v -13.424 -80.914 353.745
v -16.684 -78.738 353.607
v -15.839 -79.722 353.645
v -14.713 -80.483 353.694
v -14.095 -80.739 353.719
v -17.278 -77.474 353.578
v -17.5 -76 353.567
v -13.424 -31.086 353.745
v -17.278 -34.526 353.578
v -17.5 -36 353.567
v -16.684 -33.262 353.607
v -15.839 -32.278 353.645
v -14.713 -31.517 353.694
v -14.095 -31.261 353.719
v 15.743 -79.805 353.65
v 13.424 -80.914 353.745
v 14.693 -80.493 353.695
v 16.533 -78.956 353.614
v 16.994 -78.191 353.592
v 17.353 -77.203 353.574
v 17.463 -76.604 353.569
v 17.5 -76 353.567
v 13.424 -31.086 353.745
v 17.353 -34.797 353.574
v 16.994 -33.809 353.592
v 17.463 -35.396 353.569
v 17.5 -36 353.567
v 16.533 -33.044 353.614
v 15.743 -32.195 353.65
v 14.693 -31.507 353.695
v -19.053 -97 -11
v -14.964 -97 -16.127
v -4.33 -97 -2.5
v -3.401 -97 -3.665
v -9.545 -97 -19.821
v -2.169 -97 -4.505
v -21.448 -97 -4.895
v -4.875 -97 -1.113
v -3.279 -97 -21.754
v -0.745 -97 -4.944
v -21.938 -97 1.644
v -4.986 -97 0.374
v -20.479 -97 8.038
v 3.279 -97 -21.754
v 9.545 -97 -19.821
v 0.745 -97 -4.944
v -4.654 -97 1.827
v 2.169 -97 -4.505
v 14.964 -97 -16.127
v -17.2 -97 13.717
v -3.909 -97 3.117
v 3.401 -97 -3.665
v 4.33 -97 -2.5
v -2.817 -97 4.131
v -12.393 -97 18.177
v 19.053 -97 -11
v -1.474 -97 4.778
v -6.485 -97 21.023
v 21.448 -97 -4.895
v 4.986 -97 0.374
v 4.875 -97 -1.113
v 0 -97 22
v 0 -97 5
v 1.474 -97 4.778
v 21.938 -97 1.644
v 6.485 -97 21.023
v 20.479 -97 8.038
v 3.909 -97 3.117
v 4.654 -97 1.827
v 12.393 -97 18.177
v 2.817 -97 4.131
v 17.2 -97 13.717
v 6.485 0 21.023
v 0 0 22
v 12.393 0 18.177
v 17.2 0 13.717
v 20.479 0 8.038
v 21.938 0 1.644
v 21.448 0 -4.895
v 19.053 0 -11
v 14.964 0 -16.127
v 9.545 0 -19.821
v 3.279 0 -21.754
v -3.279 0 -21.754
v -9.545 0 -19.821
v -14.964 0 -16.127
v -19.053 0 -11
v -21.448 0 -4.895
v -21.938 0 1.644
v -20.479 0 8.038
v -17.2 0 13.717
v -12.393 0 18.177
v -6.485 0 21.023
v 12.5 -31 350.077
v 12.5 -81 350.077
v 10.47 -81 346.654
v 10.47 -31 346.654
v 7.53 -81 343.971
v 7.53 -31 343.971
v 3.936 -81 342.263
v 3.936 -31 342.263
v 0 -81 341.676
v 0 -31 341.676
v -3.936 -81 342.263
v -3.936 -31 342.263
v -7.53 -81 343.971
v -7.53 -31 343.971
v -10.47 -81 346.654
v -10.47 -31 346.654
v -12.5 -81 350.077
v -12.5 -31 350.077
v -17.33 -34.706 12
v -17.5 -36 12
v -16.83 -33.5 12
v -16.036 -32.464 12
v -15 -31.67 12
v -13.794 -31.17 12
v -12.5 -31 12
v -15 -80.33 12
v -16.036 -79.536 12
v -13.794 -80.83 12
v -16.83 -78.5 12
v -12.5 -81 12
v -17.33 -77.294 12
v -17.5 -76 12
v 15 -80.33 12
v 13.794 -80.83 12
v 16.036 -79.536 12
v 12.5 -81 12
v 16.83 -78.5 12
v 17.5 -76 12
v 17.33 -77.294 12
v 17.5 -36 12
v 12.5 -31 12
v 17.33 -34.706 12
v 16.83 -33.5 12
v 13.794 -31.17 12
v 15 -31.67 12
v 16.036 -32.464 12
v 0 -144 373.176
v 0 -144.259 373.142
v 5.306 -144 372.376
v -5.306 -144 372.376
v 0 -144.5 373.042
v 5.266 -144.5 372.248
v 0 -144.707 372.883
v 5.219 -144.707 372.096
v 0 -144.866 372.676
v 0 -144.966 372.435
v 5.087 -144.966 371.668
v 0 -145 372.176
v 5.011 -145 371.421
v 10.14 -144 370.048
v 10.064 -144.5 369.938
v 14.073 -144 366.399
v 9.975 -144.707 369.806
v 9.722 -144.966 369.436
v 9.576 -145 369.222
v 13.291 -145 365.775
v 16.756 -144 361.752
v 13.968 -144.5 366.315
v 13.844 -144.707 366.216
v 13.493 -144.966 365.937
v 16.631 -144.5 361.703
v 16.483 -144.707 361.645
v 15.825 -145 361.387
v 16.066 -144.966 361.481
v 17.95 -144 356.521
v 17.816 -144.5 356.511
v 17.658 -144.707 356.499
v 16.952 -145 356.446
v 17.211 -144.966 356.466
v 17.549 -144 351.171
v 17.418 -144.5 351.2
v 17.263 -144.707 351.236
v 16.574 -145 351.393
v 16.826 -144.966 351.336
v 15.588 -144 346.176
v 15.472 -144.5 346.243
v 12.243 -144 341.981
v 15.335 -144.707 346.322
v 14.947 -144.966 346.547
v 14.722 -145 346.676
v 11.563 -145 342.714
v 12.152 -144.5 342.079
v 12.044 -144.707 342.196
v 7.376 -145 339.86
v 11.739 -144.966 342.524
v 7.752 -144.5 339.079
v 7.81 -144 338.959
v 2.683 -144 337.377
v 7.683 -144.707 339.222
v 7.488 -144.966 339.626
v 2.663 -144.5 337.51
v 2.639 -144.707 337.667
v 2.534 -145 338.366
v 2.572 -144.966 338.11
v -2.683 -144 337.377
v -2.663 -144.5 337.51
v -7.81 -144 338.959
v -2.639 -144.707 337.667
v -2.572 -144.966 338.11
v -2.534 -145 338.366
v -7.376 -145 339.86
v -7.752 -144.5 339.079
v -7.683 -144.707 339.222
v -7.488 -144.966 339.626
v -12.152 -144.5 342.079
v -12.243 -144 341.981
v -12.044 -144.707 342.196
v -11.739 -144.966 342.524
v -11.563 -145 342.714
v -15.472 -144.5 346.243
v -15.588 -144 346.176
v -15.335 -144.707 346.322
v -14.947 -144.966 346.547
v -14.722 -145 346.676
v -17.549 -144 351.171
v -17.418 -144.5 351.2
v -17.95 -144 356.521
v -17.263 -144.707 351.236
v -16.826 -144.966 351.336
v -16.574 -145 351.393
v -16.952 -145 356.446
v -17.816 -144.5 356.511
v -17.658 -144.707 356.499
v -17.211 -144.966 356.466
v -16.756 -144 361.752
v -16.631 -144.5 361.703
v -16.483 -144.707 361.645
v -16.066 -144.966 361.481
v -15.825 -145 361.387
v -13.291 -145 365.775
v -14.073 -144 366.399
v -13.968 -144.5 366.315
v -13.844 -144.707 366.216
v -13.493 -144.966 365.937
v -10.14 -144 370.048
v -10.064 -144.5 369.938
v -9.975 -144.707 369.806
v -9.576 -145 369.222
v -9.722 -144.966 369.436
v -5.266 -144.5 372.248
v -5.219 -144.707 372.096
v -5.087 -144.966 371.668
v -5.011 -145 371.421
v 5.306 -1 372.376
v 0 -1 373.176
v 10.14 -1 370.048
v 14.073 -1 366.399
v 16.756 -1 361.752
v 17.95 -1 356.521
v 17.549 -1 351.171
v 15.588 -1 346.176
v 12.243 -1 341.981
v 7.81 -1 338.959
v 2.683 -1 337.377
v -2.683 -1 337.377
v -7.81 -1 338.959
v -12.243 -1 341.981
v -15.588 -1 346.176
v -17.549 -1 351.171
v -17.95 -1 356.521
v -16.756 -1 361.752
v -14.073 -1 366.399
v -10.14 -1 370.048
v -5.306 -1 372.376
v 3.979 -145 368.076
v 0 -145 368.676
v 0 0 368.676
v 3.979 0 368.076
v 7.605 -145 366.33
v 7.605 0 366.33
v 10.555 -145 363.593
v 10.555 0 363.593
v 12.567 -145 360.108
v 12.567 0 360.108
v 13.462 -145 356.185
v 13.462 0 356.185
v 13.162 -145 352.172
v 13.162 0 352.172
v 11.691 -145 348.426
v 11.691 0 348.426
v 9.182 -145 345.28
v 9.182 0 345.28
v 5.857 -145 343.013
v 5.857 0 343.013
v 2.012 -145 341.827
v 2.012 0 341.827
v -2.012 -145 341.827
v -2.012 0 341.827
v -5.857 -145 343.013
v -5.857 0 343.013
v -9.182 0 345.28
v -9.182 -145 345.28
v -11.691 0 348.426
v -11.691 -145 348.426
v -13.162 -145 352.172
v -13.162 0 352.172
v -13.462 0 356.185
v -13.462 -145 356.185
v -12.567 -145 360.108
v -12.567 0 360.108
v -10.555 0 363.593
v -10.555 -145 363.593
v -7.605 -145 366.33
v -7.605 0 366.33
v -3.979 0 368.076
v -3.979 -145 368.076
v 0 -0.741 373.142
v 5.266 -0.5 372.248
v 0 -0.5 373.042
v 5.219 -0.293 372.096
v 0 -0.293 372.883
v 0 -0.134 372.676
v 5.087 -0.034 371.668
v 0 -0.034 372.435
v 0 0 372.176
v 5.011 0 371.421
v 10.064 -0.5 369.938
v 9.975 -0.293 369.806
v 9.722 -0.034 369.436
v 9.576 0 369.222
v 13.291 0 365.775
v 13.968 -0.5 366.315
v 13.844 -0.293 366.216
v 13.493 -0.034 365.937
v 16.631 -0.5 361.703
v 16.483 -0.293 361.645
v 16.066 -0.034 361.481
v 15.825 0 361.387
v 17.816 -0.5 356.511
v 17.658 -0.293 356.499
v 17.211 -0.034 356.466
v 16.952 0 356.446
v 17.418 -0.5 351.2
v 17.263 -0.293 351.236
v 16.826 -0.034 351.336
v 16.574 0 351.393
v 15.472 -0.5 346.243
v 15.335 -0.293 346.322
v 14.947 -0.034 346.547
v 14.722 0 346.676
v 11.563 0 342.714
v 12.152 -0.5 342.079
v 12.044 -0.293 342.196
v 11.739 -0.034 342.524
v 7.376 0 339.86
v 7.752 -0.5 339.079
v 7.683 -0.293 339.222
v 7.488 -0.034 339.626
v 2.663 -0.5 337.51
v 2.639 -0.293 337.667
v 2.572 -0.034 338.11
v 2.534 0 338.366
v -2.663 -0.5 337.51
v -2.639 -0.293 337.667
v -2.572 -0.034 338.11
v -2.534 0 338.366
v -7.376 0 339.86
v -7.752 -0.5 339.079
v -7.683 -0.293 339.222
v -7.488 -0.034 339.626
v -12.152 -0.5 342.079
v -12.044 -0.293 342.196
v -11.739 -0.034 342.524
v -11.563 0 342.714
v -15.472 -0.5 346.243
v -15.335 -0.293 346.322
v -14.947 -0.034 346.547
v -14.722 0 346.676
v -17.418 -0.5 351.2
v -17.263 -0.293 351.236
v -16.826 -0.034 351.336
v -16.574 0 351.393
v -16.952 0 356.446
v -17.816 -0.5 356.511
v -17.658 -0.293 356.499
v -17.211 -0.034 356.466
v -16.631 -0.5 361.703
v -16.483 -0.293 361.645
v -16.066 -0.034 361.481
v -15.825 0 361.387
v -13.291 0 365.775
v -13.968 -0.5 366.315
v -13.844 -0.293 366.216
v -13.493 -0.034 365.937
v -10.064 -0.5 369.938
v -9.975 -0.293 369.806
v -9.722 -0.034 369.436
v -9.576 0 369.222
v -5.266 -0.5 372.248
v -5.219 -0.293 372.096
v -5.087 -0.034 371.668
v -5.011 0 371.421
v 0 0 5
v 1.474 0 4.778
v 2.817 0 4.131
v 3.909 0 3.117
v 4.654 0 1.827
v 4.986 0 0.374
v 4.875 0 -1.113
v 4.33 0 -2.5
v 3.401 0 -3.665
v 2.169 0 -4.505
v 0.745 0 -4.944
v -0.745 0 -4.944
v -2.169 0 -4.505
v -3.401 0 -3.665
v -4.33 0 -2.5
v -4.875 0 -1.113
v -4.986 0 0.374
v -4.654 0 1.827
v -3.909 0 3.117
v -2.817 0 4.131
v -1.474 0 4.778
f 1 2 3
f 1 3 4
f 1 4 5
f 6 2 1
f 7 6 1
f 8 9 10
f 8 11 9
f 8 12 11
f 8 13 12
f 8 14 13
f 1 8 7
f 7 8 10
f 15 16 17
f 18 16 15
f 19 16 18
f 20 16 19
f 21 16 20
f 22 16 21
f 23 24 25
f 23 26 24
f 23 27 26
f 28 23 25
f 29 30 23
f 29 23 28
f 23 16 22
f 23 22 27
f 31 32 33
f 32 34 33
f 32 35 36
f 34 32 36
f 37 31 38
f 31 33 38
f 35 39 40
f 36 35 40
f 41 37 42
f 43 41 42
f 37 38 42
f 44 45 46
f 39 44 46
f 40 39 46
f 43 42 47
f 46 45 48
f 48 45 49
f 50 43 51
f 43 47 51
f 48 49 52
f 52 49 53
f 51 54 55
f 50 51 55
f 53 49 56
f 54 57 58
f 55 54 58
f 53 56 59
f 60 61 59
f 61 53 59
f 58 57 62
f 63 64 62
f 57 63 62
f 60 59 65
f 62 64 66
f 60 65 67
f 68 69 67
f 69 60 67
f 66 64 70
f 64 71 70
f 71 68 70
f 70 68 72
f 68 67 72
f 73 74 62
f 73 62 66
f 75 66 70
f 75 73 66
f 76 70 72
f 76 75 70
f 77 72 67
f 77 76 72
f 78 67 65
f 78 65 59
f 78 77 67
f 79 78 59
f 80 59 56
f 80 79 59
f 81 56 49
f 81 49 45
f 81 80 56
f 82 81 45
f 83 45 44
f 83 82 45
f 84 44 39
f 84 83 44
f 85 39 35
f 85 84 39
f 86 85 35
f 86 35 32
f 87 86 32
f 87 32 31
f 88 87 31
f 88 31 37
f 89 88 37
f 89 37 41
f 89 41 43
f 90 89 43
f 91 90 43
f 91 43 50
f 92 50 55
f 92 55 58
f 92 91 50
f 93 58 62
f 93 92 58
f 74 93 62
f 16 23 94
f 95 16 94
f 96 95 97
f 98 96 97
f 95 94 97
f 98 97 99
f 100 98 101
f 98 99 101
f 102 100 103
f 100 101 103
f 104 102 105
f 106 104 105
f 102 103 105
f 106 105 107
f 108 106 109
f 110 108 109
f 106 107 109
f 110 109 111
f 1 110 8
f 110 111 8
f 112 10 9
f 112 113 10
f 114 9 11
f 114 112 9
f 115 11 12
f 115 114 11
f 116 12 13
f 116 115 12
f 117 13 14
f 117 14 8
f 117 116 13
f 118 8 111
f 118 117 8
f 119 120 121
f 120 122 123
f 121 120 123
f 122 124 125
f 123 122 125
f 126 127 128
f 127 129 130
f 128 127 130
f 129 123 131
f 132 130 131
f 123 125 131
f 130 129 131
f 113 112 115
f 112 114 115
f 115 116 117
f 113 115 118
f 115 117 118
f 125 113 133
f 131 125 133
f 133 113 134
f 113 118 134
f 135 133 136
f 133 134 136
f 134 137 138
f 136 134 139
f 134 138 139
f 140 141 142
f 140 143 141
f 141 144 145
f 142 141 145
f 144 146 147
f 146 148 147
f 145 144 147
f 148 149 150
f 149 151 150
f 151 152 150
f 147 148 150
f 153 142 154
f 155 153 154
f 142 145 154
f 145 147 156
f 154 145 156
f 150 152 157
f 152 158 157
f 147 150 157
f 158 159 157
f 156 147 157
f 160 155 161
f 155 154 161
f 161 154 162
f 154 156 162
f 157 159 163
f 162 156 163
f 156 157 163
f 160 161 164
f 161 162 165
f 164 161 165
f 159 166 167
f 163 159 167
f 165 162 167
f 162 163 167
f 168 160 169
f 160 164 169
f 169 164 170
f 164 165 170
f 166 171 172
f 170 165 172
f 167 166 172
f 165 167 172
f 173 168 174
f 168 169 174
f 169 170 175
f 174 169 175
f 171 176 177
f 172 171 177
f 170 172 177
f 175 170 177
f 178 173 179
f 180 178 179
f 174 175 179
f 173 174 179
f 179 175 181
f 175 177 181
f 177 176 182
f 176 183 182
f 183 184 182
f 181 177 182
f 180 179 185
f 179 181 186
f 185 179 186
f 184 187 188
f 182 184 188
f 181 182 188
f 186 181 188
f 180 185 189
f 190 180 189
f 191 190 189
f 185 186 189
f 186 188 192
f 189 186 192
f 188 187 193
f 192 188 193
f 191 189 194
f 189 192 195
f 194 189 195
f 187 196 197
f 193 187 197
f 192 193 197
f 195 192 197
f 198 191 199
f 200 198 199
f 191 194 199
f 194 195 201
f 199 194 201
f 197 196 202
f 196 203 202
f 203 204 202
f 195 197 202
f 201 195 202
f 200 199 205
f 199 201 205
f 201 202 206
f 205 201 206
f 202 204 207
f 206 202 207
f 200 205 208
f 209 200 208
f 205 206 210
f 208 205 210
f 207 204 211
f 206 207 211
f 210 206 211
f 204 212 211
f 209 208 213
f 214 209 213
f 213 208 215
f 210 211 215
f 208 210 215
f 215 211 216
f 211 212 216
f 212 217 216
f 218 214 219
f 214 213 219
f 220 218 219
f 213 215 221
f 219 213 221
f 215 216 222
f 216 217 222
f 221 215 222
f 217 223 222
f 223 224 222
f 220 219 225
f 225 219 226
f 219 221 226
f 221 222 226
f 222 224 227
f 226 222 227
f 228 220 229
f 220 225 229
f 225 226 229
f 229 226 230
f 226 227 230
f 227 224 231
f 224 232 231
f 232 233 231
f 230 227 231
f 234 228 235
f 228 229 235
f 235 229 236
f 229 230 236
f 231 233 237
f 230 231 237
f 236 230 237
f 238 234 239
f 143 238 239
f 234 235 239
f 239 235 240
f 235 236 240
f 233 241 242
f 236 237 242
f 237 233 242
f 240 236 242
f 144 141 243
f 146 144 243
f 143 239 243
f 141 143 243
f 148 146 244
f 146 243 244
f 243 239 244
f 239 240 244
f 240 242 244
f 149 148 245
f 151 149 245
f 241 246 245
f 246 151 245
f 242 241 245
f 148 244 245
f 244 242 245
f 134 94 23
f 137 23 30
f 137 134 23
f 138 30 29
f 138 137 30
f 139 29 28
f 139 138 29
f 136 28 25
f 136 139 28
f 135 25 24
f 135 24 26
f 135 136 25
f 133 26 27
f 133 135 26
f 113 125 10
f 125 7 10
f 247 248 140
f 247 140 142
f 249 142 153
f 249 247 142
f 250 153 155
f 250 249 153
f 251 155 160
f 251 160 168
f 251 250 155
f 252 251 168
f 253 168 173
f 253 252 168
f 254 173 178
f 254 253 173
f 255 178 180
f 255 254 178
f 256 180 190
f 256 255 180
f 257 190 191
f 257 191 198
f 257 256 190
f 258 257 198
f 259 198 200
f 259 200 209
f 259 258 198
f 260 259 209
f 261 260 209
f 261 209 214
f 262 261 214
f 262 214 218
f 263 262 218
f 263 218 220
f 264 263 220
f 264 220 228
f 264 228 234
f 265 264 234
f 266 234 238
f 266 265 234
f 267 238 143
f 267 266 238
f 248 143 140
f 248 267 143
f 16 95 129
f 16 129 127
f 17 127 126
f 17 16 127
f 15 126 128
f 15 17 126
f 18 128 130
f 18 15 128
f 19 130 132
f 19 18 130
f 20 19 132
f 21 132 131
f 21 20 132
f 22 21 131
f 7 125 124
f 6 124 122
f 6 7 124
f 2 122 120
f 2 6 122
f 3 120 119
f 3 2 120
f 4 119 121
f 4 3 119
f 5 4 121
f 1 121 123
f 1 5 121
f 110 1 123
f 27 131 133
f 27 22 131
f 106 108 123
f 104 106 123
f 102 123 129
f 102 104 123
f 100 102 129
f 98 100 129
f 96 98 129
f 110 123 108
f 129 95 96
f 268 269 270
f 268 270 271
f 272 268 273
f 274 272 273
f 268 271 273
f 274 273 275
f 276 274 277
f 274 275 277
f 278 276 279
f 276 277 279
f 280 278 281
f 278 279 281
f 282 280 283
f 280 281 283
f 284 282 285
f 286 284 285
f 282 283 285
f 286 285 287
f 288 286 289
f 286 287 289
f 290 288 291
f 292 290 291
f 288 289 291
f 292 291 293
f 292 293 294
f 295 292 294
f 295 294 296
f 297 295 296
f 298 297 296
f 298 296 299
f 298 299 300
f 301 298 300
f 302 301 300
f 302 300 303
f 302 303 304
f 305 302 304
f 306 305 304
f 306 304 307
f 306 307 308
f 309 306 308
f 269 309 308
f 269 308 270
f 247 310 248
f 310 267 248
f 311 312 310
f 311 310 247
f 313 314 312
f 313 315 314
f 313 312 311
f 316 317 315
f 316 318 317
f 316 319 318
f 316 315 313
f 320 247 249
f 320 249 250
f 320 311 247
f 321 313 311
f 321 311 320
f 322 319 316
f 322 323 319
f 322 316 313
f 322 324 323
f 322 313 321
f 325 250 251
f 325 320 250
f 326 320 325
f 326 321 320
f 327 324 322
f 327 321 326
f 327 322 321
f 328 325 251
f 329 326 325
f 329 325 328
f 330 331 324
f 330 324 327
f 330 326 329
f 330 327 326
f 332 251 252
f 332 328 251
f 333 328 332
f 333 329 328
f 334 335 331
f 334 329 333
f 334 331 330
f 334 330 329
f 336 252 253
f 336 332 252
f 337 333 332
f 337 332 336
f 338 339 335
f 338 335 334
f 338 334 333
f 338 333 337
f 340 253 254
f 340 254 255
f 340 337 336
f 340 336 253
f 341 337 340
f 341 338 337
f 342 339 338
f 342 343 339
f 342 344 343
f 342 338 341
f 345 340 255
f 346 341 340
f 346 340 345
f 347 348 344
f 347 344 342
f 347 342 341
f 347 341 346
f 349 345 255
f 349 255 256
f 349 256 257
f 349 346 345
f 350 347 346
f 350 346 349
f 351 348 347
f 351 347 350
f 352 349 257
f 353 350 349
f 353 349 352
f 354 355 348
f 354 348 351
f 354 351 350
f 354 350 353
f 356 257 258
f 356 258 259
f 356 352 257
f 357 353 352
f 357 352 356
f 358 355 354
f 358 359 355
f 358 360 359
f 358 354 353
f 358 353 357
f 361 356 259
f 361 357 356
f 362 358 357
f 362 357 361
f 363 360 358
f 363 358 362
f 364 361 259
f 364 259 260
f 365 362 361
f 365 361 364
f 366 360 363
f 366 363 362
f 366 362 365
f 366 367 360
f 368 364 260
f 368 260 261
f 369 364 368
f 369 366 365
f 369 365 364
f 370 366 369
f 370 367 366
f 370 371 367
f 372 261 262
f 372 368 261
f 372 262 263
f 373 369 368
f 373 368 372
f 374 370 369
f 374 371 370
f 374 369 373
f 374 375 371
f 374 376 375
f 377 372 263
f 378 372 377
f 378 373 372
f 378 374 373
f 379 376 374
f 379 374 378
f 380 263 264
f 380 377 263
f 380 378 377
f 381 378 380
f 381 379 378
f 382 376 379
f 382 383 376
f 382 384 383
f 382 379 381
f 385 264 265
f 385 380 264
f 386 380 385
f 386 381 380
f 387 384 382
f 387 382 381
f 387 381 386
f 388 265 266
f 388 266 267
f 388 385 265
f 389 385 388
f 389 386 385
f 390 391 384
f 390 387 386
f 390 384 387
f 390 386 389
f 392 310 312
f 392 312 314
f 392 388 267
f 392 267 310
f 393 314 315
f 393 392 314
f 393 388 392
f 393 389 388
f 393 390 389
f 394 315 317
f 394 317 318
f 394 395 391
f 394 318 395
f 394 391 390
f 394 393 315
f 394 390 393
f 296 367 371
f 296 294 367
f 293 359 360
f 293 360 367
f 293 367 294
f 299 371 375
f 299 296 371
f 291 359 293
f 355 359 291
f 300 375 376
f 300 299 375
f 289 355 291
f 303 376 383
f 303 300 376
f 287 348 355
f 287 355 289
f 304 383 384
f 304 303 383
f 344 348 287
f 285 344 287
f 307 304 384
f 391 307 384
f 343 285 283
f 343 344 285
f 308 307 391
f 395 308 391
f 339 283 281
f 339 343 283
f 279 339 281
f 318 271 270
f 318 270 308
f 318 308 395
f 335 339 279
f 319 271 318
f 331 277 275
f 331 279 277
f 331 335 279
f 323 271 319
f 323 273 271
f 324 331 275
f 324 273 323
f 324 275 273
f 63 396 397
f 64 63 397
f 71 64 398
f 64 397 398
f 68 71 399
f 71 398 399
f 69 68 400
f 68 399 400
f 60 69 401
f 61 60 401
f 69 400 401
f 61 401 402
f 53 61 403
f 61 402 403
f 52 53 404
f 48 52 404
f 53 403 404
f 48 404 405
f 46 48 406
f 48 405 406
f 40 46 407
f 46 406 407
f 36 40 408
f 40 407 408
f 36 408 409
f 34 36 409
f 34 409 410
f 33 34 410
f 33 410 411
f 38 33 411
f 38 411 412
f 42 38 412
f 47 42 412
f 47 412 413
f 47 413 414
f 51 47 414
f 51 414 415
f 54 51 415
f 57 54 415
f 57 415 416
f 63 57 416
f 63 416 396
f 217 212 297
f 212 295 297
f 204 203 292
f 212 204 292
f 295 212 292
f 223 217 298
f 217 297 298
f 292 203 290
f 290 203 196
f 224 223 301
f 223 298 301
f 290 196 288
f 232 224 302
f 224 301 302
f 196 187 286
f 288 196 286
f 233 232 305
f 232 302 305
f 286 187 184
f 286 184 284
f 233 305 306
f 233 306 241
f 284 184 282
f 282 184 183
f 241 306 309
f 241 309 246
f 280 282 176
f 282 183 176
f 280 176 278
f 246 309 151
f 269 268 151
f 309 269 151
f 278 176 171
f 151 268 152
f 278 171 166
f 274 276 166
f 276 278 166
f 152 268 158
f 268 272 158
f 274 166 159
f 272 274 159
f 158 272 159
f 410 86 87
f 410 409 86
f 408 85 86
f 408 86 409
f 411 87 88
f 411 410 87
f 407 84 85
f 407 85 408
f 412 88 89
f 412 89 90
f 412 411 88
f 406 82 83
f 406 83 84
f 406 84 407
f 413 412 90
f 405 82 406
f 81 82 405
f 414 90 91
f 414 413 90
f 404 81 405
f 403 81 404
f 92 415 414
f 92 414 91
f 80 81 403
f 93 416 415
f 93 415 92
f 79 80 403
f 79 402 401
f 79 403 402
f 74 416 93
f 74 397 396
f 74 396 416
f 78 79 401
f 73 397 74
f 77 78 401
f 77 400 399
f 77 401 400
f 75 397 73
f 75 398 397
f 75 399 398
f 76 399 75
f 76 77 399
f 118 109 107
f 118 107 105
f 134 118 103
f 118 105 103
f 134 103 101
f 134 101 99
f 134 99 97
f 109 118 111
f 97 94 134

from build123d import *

# Parameters (mm, degrees)
SKETCH1_R                       = 22
BOSS_EXTRUDE1_DEPTH             = 97
SKETCH2_R                       = 5
CUT_EXTRUDE1_DEPTH              = 102.867561078
BOSS_EXTRUDE2_REACH             = 332.567
BOSS_EXTRUDE2_END_RADIUS        = 354
SKETCH6_W                       = 35
SKETCH6_H                       = 50
BOSS_EXTRUDE2_DIRECTION_2_DEPTH = 10
SKETCH7_R                       = 18
BOSS_EXTRUDE3_DEPTH             = 145
SKETCH8_R                       = 13.5
CUT_EXTRUDE2_DEPTH              = 401.960544509
FILLET1_R                       = 5
FILLET2_R                       = 1


with BuildPart() as part:
    # Sketch1 → Boss-Extrude1 (new body)
    with BuildSketch(Plane(origin=(0, 0, 0), x_dir=(1, 0, 0), z_dir=(0, 1, 0))):
        with Locations(Location((0, 0, 0), (0, 0, 270))):
            Circle(SKETCH1_R)
    extrude(amount=-BOSS_EXTRUDE1_DEPTH)

    # Sketch2 → Cut-Extrude1 (cut, through all)
    with BuildSketch(Plane(origin=(0, 0, 0), x_dir=(1, 0, 0), z_dir=(0, 1, 0))):
        with Locations(Location((0, 0, 0), (0, 0, 270))):
            Circle(SKETCH2_R)
    extrude(amount=-CUT_EXTRUDE1_DEPTH, mode=Mode.SUBTRACT)


with BuildPart() as body_2:
    # Boss-Extrude2: up to this cylinder (the profile starts inside it)
    boss_extrude2_end = Plane(origin=(0, -56, 0), z_dir=(0, 1, 0)) * Cylinder(BOSS_EXTRUDE2_END_RADIUS, 1374.134, mode=Mode.PRIVATE)
    # Sketch6 → Boss-Extrude2 (new, up to the surface)
    with BuildSketch(Plane.XY.offset(22), mode=Mode.PRIVATE) as boss_extrude2_sk1:
        with Locations((0, -56)):
            Rectangle(SKETCH6_W, SKETCH6_H)
    boss_extrude2_tool1 = extrude(boss_extrude2_sk1.sketch, amount=BOSS_EXTRUDE2_REACH, mode=Mode.PRIVATE) & boss_extrude2_end
    add(boss_extrude2_tool1.solids().sort_by_distance((0, -56, 22))[0])

    # Sketch6 → Boss-Extrude2 direction 2 (add)
    with BuildSketch(Plane.XY.offset(22)):
        with Locations((0, -56)):
            Rectangle(SKETCH6_W, SKETCH6_H)
    extrude(amount=-BOSS_EXTRUDE2_DIRECTION_2_DEPTH)


with BuildPart() as body_3:
    # Sketch7 → Boss-Extrude3 (new body)
    with BuildSketch(Plane(origin=(0, 0, 0), x_dir=(1, 0, 0), z_dir=(0, 1, 0))):
        with Locations(Location((0, -355.176041906, 0), (0, 0, 270))):
            Circle(SKETCH7_R)
    extrude(amount=-BOSS_EXTRUDE3_DEPTH)


with BuildPart() as cut_extrude2_tool:
    # Sketch8 → Cut-Extrude2 (new, through all)
    with BuildSketch(Plane(origin=(0, 0, 0), x_dir=(1, 0, 0), z_dir=(0, 1, 0))):
        with Locations(Location((0, -355.176041906, 0), (0, 0, 270))):
            Circle(SKETCH8_R)
    extrude(amount=-CUT_EXTRUDE2_DEPTH)


with BuildPart() as body_2_1:
    add(body_2.part)

    # Cut-Extrude2: cut by cut_extrude2_tool
    add(cut_extrude2_tool.part, mode=Mode.SUBTRACT)

    # Fillet1
    fillet1_edges = [body_2_1.edges().sort_by_distance(p)[0] for p in [
        (-17.5, -81, 182.783589453),
        (-17.5, -31, 182.783589453),
        (17.5, -31, 182.783589453),
        (17.5, -81, 182.783589453),
    ]]
    fillet(fillet1_edges, radius=FILLET1_R)


with BuildPart() as body_3_1:
    add(body_3.part)

    # Cut-Extrude2: cut by cut_extrude2_tool
    add(cut_extrude2_tool.part, mode=Mode.SUBTRACT)

    # Fillet2
    fillet2_edges = [body_3_1.edges().sort_by_distance(p)[0] for p in [
        (0, 0, 337.176041906),
        (0, -145, 337.176041906),
    ]]
    fillet(fillet2_edges, radius=FILLET2_R)


solid = Compound([part.part, body_2_1.part, body_3_1.part])
